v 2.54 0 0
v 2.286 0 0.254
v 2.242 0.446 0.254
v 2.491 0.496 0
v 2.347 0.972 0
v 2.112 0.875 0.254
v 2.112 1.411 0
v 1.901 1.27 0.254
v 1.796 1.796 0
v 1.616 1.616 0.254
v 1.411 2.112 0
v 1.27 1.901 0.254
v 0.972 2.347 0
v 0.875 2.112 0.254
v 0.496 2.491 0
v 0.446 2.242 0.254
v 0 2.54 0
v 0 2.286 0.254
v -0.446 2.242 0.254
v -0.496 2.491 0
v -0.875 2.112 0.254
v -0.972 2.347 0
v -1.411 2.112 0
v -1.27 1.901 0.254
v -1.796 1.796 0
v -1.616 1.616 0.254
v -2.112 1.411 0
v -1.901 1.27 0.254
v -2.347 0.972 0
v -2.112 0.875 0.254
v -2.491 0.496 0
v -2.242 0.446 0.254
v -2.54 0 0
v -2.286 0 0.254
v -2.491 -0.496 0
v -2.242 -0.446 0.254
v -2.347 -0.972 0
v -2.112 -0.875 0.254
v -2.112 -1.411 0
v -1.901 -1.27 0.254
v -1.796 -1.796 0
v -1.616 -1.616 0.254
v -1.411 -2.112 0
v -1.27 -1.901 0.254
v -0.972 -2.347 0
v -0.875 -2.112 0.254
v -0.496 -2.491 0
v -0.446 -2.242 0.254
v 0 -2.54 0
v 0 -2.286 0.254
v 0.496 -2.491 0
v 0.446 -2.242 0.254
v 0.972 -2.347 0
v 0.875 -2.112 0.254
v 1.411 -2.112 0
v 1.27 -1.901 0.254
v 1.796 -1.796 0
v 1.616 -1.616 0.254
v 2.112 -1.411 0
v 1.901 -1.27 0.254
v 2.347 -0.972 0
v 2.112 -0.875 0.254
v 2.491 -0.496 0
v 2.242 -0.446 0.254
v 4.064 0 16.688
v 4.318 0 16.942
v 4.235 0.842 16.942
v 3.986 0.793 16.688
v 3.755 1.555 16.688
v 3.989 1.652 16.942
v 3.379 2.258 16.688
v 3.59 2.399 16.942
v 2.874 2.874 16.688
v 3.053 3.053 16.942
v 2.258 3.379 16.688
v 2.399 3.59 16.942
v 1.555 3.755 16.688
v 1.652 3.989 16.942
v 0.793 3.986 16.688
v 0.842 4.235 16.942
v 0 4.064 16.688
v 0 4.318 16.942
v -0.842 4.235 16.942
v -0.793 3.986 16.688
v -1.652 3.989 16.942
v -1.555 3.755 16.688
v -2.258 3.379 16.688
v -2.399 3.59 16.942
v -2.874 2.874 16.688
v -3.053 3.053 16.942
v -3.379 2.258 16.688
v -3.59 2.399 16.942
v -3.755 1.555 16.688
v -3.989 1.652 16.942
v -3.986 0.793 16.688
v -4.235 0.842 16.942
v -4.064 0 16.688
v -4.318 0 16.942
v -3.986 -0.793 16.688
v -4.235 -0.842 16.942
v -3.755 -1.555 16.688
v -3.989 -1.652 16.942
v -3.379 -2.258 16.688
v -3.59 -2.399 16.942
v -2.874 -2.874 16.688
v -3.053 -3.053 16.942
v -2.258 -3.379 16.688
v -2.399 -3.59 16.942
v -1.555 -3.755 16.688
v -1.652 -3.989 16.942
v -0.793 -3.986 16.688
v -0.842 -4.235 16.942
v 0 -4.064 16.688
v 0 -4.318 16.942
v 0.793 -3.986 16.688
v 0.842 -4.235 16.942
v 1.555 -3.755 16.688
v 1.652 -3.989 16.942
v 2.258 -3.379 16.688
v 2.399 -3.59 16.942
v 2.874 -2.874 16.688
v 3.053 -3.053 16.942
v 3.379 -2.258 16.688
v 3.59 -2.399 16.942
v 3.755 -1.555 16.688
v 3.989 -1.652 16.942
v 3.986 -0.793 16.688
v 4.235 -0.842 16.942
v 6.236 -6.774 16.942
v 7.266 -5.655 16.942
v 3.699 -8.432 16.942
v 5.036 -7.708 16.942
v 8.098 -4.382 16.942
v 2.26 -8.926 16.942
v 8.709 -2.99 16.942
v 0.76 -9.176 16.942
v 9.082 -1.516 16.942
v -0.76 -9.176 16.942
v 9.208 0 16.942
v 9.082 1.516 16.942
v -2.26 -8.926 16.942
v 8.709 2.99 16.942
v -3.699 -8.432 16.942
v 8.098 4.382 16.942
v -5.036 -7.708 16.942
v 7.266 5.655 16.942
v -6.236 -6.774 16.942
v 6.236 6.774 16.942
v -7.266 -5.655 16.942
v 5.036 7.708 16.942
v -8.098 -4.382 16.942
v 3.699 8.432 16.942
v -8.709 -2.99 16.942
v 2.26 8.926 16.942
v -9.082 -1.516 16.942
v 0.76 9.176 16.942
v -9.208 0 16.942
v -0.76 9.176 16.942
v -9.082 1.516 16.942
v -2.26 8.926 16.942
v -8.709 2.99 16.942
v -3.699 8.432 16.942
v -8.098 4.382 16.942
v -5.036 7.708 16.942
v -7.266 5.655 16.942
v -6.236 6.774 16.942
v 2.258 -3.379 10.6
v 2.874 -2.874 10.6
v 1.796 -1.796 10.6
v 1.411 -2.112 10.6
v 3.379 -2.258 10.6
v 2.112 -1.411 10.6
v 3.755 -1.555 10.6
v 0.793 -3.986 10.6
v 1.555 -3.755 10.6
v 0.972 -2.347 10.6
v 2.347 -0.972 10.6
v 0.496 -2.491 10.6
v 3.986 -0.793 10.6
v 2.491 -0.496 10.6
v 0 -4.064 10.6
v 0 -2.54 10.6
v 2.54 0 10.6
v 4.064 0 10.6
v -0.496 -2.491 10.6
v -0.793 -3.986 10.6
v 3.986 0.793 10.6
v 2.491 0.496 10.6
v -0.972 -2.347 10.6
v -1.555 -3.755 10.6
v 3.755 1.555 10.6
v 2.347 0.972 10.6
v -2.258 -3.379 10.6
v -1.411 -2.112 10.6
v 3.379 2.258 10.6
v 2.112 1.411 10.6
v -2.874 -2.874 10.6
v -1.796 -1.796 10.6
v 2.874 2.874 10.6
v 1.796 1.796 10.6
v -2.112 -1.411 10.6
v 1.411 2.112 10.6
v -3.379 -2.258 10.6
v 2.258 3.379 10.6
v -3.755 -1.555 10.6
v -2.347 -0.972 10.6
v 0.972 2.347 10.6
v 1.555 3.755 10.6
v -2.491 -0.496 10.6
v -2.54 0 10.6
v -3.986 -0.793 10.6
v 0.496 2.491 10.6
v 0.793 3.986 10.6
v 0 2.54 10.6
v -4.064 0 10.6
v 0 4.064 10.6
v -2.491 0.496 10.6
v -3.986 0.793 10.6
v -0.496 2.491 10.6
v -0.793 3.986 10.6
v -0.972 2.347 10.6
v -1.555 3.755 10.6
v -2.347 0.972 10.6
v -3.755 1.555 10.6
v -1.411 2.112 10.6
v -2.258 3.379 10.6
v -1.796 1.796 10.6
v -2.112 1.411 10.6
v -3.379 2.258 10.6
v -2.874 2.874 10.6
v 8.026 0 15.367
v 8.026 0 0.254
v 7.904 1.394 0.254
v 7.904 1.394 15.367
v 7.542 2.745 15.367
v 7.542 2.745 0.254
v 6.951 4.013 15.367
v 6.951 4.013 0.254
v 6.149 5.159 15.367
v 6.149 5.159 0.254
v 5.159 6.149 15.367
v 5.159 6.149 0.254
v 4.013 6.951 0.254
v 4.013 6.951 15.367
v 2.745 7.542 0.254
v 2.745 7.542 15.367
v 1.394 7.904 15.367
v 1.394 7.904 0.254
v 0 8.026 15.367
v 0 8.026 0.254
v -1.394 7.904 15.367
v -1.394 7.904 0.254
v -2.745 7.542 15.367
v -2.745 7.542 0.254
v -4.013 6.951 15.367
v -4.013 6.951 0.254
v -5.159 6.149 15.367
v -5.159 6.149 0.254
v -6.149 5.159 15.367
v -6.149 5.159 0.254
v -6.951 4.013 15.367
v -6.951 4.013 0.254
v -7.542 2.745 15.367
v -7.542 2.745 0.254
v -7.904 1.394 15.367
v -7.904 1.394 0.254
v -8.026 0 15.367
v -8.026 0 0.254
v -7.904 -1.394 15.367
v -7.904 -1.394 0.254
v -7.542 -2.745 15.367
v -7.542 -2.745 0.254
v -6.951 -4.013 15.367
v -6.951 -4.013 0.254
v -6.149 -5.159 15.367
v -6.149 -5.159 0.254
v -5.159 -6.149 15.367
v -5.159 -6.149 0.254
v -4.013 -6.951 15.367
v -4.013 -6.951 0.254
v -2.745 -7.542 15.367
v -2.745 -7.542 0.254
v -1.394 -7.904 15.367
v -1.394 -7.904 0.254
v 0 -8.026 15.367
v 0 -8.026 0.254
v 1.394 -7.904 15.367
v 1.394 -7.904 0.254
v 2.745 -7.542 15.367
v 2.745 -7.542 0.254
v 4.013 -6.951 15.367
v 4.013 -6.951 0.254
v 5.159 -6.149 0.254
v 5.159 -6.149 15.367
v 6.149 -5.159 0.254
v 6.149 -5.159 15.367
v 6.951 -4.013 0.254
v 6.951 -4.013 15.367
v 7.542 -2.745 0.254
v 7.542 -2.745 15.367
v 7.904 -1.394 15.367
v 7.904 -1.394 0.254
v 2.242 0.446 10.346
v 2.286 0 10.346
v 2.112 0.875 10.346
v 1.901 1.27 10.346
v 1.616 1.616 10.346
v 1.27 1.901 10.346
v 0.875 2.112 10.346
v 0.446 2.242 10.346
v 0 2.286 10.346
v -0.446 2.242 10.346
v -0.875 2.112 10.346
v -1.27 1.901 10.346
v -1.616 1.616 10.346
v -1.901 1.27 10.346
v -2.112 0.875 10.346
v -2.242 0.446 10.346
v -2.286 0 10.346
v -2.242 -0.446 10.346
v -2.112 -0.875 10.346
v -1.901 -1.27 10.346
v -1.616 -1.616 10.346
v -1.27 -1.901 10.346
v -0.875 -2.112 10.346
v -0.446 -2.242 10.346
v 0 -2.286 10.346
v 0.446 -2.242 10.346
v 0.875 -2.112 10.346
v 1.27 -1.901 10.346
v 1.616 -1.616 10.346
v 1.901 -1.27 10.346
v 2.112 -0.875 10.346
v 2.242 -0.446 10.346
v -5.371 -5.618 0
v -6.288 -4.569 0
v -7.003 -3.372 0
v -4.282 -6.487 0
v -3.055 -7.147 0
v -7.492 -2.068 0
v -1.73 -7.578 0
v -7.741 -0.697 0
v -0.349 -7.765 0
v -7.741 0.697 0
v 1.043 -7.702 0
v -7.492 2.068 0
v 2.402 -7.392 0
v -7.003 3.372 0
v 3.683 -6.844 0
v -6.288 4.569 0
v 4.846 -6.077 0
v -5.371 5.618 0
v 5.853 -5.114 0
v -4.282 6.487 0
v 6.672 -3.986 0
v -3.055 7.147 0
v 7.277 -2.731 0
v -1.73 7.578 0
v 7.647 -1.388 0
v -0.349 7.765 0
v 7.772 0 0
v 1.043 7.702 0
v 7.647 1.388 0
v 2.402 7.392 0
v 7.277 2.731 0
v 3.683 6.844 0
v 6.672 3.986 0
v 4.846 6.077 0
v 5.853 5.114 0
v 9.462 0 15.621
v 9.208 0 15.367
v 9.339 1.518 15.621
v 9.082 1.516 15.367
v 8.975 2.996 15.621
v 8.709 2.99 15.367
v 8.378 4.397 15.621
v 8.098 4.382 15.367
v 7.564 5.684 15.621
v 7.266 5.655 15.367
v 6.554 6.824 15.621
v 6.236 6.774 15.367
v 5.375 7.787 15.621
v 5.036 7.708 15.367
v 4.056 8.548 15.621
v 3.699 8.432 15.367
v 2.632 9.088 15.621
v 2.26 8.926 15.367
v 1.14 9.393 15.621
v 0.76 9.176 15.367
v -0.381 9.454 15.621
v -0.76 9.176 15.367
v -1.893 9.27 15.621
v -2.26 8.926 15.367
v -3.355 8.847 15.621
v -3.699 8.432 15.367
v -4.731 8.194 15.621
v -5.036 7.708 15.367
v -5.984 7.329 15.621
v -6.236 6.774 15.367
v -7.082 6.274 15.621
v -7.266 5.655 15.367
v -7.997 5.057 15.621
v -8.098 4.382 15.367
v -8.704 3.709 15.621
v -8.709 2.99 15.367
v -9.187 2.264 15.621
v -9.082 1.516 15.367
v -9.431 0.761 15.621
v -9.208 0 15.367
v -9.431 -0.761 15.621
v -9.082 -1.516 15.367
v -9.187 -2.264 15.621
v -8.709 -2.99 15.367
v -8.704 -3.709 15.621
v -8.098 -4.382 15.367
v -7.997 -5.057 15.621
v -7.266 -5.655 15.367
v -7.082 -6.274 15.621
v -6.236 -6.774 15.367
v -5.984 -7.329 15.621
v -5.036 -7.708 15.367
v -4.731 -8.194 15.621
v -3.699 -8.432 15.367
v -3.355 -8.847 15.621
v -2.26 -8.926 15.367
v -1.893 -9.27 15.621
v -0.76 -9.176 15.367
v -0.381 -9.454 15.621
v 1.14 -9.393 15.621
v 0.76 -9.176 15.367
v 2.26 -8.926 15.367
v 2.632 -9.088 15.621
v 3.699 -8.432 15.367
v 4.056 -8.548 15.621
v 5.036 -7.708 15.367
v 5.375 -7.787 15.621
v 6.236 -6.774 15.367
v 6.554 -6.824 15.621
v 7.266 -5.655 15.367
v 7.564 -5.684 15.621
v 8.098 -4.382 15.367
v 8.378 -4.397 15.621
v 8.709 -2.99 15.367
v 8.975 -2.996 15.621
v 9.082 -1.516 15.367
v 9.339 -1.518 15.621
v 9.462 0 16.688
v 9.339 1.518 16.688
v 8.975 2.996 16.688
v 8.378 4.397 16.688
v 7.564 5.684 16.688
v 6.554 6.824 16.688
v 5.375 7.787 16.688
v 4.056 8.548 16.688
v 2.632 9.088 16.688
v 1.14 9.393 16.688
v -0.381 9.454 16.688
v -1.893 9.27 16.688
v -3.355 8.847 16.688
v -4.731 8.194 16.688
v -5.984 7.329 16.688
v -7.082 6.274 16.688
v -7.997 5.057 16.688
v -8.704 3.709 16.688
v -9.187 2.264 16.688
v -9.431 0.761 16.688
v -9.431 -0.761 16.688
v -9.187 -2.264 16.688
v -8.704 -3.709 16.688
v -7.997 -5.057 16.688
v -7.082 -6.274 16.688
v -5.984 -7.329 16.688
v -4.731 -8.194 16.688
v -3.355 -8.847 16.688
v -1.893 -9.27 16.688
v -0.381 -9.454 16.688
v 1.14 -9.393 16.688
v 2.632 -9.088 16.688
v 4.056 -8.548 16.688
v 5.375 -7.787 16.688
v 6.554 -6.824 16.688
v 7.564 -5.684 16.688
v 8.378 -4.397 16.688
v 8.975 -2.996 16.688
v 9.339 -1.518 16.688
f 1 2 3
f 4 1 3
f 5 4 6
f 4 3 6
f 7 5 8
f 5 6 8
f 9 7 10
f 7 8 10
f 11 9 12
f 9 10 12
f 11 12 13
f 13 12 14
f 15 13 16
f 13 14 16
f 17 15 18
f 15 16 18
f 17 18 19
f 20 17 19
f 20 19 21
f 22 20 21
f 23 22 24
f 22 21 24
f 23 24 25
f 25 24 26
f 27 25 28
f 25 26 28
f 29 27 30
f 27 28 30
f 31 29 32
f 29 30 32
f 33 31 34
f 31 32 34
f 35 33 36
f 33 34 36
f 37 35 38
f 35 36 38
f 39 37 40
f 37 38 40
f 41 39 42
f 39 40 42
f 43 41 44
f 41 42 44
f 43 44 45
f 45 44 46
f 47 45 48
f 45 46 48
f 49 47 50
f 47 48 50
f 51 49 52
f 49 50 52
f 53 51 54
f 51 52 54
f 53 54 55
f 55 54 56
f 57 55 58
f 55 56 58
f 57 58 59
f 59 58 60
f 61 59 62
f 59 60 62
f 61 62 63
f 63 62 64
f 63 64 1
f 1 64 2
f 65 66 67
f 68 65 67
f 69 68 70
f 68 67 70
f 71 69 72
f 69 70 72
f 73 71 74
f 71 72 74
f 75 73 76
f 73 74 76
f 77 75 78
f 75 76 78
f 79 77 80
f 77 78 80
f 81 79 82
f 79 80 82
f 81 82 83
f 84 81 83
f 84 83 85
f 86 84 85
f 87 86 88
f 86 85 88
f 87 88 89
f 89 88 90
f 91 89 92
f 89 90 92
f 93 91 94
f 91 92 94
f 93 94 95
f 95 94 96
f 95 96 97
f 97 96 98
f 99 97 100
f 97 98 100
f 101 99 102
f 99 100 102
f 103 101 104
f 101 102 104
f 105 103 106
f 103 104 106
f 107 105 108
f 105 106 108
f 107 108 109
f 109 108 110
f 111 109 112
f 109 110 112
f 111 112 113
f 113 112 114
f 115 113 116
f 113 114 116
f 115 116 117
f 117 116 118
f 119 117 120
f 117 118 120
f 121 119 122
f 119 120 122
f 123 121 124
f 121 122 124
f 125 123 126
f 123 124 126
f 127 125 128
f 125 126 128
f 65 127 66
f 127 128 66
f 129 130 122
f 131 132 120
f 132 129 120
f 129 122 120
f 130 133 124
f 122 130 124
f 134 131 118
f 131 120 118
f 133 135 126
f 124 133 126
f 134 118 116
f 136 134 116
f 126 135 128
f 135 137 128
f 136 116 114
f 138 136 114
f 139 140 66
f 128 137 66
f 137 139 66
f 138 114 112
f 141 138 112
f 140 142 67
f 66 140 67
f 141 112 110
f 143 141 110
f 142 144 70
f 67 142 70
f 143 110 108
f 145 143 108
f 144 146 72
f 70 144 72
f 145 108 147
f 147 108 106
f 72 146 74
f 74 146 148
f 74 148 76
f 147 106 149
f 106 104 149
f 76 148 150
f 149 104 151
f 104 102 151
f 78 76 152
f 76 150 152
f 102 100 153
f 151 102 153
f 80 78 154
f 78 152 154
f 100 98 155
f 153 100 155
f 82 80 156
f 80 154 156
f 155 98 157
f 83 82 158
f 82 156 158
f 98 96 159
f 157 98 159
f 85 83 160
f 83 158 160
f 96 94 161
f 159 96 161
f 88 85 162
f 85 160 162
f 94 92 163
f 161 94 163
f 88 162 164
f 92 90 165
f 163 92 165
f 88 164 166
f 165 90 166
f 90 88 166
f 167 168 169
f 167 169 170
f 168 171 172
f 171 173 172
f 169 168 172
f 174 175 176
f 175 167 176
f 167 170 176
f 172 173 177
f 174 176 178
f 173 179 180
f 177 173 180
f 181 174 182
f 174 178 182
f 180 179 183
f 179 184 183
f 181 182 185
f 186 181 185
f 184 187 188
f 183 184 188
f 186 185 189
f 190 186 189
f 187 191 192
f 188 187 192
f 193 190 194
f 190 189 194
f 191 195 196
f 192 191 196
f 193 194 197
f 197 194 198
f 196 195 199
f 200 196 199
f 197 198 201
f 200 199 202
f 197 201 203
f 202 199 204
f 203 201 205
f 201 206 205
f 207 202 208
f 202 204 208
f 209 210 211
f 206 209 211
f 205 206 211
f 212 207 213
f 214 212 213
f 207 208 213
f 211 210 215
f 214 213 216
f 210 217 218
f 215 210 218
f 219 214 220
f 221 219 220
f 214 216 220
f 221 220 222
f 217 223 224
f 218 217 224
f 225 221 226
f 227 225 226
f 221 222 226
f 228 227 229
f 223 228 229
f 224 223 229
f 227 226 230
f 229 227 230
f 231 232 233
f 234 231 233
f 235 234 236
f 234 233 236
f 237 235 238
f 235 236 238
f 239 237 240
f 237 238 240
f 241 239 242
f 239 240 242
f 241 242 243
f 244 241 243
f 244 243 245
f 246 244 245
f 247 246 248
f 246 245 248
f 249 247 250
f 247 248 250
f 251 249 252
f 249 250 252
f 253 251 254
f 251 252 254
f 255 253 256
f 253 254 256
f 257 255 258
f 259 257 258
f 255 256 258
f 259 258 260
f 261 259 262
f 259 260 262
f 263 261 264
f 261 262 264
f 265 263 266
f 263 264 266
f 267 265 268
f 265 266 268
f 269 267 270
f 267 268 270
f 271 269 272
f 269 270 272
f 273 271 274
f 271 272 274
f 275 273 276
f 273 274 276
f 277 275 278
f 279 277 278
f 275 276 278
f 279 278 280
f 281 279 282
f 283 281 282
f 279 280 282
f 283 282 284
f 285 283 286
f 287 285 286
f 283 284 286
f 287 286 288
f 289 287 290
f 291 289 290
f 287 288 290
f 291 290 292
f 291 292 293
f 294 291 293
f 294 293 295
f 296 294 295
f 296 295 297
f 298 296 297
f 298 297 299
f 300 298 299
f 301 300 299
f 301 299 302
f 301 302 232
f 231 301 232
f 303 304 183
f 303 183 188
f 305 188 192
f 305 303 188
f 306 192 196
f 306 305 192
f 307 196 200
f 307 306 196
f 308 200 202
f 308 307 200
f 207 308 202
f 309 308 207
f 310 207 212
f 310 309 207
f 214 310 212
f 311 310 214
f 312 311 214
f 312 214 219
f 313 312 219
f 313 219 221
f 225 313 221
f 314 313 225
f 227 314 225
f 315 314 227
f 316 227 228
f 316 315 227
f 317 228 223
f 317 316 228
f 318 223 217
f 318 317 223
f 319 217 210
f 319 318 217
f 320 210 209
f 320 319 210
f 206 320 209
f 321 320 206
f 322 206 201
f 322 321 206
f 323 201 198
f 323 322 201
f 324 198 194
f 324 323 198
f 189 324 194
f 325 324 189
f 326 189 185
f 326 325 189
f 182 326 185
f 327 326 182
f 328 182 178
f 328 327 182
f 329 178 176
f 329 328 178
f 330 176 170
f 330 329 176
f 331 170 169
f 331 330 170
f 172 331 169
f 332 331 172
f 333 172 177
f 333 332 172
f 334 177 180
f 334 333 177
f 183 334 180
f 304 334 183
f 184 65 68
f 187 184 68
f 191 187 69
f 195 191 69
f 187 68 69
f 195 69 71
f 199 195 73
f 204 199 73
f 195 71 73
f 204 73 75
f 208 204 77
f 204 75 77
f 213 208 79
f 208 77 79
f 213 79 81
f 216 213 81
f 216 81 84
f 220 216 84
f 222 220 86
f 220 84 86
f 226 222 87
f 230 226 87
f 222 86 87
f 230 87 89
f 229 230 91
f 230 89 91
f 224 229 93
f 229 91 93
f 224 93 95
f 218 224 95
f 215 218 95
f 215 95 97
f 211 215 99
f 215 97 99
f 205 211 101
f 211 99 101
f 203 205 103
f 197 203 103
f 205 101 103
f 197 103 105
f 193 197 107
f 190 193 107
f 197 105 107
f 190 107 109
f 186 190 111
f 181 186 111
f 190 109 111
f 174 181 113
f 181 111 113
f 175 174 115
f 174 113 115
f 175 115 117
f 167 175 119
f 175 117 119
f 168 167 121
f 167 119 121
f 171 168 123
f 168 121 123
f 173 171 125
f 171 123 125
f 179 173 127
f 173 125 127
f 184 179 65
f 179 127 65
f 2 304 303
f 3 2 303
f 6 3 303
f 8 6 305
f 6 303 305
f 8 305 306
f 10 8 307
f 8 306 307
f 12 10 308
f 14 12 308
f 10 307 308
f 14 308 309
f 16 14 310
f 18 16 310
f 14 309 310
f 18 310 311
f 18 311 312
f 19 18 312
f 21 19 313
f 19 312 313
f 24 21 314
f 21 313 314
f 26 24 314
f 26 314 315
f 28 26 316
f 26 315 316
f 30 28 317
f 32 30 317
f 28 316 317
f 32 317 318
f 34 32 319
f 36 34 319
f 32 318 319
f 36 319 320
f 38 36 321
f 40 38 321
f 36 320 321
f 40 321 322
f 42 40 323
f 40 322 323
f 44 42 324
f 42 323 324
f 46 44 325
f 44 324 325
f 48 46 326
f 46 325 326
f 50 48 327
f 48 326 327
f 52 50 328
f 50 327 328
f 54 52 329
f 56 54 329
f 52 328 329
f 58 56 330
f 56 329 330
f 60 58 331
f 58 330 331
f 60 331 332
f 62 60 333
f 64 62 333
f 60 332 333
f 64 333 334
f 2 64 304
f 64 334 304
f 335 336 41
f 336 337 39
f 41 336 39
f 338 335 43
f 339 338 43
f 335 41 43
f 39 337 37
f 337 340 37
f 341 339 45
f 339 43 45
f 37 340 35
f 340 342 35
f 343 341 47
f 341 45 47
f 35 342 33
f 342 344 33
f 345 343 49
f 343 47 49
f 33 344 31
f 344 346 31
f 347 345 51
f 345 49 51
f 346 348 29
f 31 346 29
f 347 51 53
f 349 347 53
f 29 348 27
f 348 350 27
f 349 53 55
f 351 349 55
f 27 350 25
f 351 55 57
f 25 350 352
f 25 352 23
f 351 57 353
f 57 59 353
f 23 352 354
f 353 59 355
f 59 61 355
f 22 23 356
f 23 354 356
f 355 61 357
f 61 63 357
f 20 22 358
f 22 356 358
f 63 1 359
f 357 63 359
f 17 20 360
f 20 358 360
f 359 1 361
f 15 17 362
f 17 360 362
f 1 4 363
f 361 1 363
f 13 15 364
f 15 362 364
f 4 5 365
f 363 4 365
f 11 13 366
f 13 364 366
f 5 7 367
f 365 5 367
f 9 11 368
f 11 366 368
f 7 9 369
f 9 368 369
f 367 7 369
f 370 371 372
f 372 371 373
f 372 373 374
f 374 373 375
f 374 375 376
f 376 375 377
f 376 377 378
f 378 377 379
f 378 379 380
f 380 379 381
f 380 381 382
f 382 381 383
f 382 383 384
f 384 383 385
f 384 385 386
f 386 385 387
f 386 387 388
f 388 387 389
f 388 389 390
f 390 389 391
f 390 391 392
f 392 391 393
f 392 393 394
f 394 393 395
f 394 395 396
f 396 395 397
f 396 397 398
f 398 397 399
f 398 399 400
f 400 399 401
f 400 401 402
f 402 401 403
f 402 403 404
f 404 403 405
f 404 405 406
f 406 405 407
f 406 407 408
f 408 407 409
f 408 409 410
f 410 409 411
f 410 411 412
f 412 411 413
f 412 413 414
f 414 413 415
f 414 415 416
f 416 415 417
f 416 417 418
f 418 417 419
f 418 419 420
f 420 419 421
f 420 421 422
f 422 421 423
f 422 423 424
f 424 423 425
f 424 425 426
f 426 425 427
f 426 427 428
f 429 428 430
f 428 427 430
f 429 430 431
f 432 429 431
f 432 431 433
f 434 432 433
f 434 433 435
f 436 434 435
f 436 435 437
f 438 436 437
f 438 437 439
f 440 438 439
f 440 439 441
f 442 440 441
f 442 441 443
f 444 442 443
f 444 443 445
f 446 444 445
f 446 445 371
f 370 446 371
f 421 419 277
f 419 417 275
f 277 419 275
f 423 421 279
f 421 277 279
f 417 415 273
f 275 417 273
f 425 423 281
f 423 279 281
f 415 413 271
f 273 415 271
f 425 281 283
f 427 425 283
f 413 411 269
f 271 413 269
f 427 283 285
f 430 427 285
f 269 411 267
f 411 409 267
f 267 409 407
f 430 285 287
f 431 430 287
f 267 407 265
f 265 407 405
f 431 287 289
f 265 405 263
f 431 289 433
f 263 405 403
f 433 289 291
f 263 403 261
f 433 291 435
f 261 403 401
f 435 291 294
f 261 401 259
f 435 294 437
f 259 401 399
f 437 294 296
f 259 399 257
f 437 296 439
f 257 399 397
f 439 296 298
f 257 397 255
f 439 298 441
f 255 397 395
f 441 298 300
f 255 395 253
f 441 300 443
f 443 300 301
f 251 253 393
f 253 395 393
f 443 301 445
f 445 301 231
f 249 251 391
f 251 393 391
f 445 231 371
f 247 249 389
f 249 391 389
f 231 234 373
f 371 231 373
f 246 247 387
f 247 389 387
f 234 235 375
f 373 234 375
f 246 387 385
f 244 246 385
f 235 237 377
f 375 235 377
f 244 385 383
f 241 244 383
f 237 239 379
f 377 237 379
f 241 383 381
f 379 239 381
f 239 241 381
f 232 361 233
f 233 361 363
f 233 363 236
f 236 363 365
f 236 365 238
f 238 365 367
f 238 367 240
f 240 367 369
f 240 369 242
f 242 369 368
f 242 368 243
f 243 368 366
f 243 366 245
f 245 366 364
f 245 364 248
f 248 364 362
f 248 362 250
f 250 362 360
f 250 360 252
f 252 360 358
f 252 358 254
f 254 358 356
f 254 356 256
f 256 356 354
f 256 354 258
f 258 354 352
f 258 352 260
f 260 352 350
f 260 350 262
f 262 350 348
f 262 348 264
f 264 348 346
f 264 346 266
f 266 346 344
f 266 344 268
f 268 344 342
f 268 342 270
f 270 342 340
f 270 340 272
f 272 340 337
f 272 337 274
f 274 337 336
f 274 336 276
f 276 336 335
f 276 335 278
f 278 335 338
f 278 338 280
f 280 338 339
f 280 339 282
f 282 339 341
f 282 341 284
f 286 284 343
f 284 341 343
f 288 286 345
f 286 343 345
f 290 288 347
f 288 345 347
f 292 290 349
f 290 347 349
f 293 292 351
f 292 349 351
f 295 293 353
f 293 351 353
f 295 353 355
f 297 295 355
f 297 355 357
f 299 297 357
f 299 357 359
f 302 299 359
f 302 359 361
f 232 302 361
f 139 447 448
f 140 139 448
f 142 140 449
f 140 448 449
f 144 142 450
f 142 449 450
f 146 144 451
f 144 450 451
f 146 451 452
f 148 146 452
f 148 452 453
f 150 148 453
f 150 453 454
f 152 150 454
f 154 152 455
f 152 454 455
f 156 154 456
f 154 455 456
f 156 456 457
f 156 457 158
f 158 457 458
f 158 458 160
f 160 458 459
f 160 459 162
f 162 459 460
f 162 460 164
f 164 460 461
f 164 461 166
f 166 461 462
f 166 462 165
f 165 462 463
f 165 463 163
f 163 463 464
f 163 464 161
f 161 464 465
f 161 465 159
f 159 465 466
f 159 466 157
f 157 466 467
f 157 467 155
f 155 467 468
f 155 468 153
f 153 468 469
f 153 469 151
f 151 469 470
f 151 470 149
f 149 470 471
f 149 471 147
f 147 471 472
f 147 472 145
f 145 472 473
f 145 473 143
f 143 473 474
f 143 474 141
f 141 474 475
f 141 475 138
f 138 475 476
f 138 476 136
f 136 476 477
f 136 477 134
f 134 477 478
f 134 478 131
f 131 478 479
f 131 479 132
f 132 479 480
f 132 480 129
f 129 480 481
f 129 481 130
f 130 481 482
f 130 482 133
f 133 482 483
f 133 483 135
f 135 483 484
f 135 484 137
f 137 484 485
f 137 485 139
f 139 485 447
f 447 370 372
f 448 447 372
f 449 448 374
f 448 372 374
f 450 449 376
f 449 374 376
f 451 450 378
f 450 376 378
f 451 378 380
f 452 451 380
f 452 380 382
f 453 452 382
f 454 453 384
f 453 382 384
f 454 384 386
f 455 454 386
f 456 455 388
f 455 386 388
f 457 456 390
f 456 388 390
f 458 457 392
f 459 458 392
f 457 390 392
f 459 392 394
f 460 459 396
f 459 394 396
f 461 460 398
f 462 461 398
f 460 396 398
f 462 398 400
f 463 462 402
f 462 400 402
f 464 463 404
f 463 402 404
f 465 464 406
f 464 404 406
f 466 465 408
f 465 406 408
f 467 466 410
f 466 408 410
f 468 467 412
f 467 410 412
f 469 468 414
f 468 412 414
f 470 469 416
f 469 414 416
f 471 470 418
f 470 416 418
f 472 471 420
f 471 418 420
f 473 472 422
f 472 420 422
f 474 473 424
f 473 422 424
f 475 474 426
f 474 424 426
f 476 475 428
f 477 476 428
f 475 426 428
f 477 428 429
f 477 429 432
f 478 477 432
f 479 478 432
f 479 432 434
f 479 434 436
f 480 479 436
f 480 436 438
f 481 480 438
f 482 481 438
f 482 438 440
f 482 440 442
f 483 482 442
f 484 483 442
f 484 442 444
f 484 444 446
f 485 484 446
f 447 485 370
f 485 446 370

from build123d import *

# Parameters (mm, degrees)
CHAMFER1_SIZE = 0.254


with BuildPart() as part:
    # Sketch1 → Revolve1 (revolve)
    with BuildSketch(Plane(origin=(0, 0, 0), x_dir=(1, 0, 0), z_dir=(0, 1, 0))):
        Polygon((2.286, -10.6), (4.064, -10.6), (4.064, -16.9418), (9.4615, -16.9418), (9.4615, -15.367), (8.0264, -15.367), (8.0264, 0), (2.286, 0), align=None)
    revolve(axis=Axis((0, 0, 0), (0, 0, 1)))

    # Chamfer1
    chamfer1_edges = [part.edges().sort_by_distance(p)[0] for p in [
        (-2.286, 0, 0),
        (-8.0264, 0, 0),
        (-9.4615, 0, 15.367),
        (-9.4615, 0, 16.9418),
        (-4.064, 0, 16.9418),
        (-2.286, 0, 10.6),
    ]]
    chamfer(chamfer1_edges, length=CHAMFER1_SIZE)


solid = part.part
